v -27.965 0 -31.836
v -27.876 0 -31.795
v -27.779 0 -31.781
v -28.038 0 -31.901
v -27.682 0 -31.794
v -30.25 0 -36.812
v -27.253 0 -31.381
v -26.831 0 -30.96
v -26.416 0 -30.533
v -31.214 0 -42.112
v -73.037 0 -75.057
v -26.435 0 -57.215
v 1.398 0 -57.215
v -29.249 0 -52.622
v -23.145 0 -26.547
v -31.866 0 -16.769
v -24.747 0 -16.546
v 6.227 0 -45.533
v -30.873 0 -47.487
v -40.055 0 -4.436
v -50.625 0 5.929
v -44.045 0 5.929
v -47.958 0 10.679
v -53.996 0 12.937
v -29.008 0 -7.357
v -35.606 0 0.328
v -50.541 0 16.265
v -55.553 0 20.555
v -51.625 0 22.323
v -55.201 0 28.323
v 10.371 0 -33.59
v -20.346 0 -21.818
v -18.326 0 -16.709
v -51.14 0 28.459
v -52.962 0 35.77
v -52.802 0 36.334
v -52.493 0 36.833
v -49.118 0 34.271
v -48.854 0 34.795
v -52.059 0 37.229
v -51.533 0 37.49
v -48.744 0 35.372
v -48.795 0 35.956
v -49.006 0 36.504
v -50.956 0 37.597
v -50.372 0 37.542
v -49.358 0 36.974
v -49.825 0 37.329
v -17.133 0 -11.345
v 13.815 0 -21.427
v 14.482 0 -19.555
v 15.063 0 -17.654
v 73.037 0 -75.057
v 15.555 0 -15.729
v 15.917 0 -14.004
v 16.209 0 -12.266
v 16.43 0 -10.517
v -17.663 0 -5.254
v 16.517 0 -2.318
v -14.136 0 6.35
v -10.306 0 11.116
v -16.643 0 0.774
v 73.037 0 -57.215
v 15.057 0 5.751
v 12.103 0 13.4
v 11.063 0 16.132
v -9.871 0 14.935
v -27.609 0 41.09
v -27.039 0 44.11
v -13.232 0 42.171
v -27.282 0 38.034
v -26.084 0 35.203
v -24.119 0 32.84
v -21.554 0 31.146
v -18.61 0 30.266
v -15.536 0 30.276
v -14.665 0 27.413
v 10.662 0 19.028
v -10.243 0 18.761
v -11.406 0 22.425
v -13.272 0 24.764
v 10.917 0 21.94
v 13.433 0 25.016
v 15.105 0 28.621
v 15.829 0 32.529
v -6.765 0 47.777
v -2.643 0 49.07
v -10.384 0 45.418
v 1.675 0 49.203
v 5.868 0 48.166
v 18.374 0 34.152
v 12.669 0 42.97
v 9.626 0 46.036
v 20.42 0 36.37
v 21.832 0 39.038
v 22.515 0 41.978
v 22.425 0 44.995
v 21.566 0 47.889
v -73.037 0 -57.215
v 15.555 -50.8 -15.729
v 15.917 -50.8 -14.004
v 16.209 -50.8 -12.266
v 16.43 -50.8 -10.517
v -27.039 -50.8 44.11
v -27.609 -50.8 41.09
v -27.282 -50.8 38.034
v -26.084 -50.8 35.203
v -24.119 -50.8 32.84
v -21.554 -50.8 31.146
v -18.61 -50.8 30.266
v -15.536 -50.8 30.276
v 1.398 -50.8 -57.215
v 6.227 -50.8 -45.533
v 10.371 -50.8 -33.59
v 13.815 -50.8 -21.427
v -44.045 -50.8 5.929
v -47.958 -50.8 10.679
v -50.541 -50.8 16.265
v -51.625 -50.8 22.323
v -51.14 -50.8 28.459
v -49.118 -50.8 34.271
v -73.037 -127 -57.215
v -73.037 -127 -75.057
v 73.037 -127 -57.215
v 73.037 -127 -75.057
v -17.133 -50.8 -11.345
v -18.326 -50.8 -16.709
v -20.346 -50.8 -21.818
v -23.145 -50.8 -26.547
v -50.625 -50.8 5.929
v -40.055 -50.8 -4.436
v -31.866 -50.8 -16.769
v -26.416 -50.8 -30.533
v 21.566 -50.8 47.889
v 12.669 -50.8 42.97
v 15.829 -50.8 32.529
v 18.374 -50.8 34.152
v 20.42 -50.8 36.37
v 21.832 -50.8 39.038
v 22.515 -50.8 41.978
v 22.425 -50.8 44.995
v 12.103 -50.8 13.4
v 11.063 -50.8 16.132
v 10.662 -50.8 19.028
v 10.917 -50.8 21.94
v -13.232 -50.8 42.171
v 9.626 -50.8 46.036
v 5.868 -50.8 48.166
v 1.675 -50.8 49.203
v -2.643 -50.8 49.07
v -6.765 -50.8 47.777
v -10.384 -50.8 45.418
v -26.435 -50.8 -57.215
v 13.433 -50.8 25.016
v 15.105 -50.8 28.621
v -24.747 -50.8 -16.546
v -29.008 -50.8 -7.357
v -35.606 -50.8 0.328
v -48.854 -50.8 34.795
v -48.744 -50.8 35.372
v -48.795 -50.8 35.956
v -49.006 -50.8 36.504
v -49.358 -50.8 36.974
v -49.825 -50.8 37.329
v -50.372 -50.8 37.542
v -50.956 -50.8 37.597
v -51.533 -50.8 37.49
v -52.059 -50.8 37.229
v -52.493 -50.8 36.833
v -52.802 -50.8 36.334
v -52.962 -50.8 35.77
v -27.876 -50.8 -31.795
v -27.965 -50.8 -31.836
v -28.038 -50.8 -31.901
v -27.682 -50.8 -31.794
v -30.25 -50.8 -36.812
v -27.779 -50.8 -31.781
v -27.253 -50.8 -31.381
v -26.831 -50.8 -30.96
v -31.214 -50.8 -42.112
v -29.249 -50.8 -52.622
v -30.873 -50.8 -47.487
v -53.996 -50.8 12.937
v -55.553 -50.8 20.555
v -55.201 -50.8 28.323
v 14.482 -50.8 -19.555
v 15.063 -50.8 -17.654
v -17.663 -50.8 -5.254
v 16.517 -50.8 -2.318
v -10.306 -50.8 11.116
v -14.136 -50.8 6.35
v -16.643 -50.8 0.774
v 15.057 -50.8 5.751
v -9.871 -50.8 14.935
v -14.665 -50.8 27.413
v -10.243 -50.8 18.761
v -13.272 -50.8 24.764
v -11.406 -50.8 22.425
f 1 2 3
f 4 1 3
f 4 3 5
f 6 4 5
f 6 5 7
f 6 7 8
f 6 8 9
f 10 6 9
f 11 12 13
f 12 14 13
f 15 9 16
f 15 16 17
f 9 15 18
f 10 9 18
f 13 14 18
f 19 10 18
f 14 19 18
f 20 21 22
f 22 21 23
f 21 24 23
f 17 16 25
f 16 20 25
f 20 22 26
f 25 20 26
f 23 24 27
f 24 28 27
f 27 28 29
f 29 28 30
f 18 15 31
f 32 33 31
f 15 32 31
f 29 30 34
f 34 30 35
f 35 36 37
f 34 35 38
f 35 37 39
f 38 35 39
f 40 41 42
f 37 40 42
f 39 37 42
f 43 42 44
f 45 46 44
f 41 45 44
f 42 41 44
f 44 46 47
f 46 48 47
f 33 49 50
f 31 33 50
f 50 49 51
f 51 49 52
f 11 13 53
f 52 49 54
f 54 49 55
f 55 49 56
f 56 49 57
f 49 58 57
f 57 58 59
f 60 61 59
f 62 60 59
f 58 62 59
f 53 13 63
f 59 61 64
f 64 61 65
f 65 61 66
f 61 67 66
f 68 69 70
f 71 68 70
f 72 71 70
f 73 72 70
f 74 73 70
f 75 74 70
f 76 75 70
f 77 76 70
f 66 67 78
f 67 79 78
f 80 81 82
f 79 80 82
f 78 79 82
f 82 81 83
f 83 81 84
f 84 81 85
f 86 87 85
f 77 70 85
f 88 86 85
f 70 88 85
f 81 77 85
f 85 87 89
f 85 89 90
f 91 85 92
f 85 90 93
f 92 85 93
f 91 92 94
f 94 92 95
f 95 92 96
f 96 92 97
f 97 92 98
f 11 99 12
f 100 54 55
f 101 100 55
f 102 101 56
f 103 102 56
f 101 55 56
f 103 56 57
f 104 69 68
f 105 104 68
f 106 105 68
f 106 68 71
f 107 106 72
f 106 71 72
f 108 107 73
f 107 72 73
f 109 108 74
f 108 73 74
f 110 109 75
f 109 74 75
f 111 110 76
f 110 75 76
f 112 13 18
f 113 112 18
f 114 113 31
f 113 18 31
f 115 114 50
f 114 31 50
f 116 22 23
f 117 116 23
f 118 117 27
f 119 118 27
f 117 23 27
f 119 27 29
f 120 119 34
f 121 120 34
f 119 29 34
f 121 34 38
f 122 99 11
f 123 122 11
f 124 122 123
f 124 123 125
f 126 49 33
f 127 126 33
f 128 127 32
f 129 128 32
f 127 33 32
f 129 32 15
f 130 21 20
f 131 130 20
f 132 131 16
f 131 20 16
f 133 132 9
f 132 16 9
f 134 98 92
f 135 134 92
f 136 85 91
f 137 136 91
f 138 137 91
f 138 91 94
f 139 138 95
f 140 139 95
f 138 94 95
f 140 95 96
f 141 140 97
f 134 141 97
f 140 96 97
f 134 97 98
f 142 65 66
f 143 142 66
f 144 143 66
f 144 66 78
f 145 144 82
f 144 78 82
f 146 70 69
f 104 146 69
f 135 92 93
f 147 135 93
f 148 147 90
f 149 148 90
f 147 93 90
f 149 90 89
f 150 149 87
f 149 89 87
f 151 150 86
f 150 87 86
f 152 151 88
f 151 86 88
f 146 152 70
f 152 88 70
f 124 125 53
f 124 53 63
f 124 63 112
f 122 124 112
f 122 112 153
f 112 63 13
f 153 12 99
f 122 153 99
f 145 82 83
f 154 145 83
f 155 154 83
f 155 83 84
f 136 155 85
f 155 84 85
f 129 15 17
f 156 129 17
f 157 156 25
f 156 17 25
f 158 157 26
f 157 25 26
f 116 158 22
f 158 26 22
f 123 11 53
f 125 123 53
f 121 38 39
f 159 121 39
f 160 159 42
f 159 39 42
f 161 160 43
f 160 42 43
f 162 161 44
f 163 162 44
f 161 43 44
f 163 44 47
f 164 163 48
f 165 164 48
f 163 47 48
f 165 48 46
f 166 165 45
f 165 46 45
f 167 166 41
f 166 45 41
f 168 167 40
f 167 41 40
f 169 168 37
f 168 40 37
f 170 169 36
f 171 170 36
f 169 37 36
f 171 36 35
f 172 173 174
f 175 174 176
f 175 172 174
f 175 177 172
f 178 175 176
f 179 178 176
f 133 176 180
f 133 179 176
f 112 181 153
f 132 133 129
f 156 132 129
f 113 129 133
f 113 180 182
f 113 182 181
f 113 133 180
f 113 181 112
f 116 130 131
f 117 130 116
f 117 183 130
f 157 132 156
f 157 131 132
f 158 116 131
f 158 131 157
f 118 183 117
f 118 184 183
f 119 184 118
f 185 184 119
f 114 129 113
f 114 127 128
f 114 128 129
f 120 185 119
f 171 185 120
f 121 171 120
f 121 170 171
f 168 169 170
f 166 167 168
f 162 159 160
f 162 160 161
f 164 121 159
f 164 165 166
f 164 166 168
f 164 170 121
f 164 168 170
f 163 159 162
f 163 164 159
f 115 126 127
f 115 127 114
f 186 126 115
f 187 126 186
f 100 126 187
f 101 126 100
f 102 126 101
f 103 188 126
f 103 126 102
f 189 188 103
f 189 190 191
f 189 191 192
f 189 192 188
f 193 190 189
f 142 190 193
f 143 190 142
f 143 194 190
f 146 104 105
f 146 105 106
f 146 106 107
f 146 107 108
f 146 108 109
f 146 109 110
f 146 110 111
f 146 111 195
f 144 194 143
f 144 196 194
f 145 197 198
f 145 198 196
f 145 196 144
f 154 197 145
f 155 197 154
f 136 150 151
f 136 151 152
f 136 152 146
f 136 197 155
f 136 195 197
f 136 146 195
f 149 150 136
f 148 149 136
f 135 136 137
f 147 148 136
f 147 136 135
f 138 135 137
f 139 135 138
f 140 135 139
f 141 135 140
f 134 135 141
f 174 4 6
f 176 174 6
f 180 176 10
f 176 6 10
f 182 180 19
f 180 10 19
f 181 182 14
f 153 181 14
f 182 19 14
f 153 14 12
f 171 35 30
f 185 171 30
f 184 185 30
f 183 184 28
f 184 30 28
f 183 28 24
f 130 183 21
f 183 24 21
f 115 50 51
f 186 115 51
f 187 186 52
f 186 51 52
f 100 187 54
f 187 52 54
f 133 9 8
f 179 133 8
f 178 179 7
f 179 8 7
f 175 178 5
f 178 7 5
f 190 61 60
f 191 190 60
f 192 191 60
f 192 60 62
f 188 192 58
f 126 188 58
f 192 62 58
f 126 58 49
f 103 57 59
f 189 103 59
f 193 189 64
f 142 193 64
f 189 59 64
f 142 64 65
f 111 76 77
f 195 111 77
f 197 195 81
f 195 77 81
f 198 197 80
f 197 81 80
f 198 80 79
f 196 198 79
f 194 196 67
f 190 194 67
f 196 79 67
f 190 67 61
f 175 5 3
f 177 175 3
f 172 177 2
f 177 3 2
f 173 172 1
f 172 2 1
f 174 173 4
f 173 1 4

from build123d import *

# Parameters (mm, degrees)
F1_DEPTH = 127
F2_DEPTH = 50.8


with BuildPart() as f1:
    # F0 (on Front) → F1 (new body)
    with BuildSketch(Plane.XZ):
        Polygon((-26.435141, -57.215432), (-73.037098, -57.215432), (-73.037098, -75.057486), (73.037098, -75.057486), (73.037098, -57.215432), (1.397706, -57.215432), align=None)
    extrude(amount=F1_DEPTH)

    # F0 (on Front) → F2 (join)
    with BuildSketch(Plane.XZ):
        with BuildLine():
            ThreePointArc((-28.038343, -31.901021), (-31.207175, -44.80968), (-26.435141, -57.215432))
            Line((-26.435141, -57.215432), (1.397706, -57.215432))
            ThreePointArc((1.397706, -57.215432), (8.385599, -39.591583), (13.815437, -21.427125))
            ThreePointArc((13.815437, -21.427125), (14.783315, -18.607969), (15.555009, -15.728923))
            ThreePointArc((15.555009, -15.728923), (16.072278, -13.136524), (16.430436, -10.517398))
            ThreePointArc((16.430436, -10.517398), (15.978576, 1.750902), (12.102647, 13.399617))
            ThreePointArc((12.102647, 13.399617), (10.780812, 17.568694), (10.917028, 21.940181))
            ThreePointArc((10.917028, 21.940181), (14.382768, 26.766265), (15.82858, 32.529256))
            ThreePointArc((15.82858, 32.529256), (15.174964, 38.029758), (12.669052, 42.96971))
            ThreePointArc((12.669052, 42.96971), (-0.488801, 49.284531), (-13.232451, 42.170782))
            ThreePointArc((-13.232451, 42.170782), (-15.565366, 36.45211), (-15.536207, 30.275958))
            ThreePointArc((-15.536207, 30.275958), (-14.031369, 26.055756), (-11.405967, 22.425065))
            ThreePointArc((-11.405967, 22.425065), (-9.956311, 16.857974), (-10.306361, 11.115896))
            ThreePointArc((-10.306361, 11.115896), (-16.642557, 0.773962), (-17.132959, -11.344721))
            ThreePointArc((-17.132959, -11.344721), (-19.235101, -19.303269), (-23.144801, -26.547005))
            ThreePointArc((-23.144801, -26.547005), (-24.70678, -28.600459), (-26.416359, -30.532761))
            ThreePointArc((-26.416359, -30.532761), (-27.040856, -31.171473), (-27.681515, -31.793972))
            ThreePointArc((-27.681515, -31.793972), (-27.875593, -31.795282), (-28.038343, -31.901021))
        make_face()
        with BuildLine():
            ThreePointArc((12.669052, 42.96971), (15.174964, 38.029758), (15.82858, 32.529256))
            ThreePointArc((15.82858, 32.529256), (21.831874, 39.038084), (21.566212, 47.888722))
            Line((21.566212, 47.888722), (12.669052, 42.96971))
        make_face()
        with BuildLine():
            ThreePointArc((-27.039211, 44.109747), (-25.18838, 33.949385), (-15.536207, 30.275958))
            ThreePointArc((-15.536207, 30.275958), (-15.565366, 36.45211), (-13.232451, 42.170782))
            Line((-13.232451, 42.170782), (-27.039211, 44.109747))
        make_face()
        with BuildLine():
            ThreePointArc((-50.62522, 5.92908), (-35.638015, -10.387821), (-26.416359, -30.532761))
            ThreePointArc((-26.416359, -30.532761), (-24.70678, -28.600459), (-23.144801, -26.547005))
            ThreePointArc((-23.144801, -26.547005), (-29.007683, -7.357016), (-44.044595, 5.92908))
            ThreePointArc((-44.044595, 5.92908), (-51.27709, 19.259676), (-49.117848, 34.271386))
            ThreePointArc((-49.117848, 34.271386), (-50.091291, 37.454091), (-52.961979, 35.769943))
            ThreePointArc((-52.961979, 35.769943), (-55.552639, 20.555151), (-50.62522, 5.92908))
        make_face()
    extrude(amount=F2_DEPTH)


solid = f1.part
